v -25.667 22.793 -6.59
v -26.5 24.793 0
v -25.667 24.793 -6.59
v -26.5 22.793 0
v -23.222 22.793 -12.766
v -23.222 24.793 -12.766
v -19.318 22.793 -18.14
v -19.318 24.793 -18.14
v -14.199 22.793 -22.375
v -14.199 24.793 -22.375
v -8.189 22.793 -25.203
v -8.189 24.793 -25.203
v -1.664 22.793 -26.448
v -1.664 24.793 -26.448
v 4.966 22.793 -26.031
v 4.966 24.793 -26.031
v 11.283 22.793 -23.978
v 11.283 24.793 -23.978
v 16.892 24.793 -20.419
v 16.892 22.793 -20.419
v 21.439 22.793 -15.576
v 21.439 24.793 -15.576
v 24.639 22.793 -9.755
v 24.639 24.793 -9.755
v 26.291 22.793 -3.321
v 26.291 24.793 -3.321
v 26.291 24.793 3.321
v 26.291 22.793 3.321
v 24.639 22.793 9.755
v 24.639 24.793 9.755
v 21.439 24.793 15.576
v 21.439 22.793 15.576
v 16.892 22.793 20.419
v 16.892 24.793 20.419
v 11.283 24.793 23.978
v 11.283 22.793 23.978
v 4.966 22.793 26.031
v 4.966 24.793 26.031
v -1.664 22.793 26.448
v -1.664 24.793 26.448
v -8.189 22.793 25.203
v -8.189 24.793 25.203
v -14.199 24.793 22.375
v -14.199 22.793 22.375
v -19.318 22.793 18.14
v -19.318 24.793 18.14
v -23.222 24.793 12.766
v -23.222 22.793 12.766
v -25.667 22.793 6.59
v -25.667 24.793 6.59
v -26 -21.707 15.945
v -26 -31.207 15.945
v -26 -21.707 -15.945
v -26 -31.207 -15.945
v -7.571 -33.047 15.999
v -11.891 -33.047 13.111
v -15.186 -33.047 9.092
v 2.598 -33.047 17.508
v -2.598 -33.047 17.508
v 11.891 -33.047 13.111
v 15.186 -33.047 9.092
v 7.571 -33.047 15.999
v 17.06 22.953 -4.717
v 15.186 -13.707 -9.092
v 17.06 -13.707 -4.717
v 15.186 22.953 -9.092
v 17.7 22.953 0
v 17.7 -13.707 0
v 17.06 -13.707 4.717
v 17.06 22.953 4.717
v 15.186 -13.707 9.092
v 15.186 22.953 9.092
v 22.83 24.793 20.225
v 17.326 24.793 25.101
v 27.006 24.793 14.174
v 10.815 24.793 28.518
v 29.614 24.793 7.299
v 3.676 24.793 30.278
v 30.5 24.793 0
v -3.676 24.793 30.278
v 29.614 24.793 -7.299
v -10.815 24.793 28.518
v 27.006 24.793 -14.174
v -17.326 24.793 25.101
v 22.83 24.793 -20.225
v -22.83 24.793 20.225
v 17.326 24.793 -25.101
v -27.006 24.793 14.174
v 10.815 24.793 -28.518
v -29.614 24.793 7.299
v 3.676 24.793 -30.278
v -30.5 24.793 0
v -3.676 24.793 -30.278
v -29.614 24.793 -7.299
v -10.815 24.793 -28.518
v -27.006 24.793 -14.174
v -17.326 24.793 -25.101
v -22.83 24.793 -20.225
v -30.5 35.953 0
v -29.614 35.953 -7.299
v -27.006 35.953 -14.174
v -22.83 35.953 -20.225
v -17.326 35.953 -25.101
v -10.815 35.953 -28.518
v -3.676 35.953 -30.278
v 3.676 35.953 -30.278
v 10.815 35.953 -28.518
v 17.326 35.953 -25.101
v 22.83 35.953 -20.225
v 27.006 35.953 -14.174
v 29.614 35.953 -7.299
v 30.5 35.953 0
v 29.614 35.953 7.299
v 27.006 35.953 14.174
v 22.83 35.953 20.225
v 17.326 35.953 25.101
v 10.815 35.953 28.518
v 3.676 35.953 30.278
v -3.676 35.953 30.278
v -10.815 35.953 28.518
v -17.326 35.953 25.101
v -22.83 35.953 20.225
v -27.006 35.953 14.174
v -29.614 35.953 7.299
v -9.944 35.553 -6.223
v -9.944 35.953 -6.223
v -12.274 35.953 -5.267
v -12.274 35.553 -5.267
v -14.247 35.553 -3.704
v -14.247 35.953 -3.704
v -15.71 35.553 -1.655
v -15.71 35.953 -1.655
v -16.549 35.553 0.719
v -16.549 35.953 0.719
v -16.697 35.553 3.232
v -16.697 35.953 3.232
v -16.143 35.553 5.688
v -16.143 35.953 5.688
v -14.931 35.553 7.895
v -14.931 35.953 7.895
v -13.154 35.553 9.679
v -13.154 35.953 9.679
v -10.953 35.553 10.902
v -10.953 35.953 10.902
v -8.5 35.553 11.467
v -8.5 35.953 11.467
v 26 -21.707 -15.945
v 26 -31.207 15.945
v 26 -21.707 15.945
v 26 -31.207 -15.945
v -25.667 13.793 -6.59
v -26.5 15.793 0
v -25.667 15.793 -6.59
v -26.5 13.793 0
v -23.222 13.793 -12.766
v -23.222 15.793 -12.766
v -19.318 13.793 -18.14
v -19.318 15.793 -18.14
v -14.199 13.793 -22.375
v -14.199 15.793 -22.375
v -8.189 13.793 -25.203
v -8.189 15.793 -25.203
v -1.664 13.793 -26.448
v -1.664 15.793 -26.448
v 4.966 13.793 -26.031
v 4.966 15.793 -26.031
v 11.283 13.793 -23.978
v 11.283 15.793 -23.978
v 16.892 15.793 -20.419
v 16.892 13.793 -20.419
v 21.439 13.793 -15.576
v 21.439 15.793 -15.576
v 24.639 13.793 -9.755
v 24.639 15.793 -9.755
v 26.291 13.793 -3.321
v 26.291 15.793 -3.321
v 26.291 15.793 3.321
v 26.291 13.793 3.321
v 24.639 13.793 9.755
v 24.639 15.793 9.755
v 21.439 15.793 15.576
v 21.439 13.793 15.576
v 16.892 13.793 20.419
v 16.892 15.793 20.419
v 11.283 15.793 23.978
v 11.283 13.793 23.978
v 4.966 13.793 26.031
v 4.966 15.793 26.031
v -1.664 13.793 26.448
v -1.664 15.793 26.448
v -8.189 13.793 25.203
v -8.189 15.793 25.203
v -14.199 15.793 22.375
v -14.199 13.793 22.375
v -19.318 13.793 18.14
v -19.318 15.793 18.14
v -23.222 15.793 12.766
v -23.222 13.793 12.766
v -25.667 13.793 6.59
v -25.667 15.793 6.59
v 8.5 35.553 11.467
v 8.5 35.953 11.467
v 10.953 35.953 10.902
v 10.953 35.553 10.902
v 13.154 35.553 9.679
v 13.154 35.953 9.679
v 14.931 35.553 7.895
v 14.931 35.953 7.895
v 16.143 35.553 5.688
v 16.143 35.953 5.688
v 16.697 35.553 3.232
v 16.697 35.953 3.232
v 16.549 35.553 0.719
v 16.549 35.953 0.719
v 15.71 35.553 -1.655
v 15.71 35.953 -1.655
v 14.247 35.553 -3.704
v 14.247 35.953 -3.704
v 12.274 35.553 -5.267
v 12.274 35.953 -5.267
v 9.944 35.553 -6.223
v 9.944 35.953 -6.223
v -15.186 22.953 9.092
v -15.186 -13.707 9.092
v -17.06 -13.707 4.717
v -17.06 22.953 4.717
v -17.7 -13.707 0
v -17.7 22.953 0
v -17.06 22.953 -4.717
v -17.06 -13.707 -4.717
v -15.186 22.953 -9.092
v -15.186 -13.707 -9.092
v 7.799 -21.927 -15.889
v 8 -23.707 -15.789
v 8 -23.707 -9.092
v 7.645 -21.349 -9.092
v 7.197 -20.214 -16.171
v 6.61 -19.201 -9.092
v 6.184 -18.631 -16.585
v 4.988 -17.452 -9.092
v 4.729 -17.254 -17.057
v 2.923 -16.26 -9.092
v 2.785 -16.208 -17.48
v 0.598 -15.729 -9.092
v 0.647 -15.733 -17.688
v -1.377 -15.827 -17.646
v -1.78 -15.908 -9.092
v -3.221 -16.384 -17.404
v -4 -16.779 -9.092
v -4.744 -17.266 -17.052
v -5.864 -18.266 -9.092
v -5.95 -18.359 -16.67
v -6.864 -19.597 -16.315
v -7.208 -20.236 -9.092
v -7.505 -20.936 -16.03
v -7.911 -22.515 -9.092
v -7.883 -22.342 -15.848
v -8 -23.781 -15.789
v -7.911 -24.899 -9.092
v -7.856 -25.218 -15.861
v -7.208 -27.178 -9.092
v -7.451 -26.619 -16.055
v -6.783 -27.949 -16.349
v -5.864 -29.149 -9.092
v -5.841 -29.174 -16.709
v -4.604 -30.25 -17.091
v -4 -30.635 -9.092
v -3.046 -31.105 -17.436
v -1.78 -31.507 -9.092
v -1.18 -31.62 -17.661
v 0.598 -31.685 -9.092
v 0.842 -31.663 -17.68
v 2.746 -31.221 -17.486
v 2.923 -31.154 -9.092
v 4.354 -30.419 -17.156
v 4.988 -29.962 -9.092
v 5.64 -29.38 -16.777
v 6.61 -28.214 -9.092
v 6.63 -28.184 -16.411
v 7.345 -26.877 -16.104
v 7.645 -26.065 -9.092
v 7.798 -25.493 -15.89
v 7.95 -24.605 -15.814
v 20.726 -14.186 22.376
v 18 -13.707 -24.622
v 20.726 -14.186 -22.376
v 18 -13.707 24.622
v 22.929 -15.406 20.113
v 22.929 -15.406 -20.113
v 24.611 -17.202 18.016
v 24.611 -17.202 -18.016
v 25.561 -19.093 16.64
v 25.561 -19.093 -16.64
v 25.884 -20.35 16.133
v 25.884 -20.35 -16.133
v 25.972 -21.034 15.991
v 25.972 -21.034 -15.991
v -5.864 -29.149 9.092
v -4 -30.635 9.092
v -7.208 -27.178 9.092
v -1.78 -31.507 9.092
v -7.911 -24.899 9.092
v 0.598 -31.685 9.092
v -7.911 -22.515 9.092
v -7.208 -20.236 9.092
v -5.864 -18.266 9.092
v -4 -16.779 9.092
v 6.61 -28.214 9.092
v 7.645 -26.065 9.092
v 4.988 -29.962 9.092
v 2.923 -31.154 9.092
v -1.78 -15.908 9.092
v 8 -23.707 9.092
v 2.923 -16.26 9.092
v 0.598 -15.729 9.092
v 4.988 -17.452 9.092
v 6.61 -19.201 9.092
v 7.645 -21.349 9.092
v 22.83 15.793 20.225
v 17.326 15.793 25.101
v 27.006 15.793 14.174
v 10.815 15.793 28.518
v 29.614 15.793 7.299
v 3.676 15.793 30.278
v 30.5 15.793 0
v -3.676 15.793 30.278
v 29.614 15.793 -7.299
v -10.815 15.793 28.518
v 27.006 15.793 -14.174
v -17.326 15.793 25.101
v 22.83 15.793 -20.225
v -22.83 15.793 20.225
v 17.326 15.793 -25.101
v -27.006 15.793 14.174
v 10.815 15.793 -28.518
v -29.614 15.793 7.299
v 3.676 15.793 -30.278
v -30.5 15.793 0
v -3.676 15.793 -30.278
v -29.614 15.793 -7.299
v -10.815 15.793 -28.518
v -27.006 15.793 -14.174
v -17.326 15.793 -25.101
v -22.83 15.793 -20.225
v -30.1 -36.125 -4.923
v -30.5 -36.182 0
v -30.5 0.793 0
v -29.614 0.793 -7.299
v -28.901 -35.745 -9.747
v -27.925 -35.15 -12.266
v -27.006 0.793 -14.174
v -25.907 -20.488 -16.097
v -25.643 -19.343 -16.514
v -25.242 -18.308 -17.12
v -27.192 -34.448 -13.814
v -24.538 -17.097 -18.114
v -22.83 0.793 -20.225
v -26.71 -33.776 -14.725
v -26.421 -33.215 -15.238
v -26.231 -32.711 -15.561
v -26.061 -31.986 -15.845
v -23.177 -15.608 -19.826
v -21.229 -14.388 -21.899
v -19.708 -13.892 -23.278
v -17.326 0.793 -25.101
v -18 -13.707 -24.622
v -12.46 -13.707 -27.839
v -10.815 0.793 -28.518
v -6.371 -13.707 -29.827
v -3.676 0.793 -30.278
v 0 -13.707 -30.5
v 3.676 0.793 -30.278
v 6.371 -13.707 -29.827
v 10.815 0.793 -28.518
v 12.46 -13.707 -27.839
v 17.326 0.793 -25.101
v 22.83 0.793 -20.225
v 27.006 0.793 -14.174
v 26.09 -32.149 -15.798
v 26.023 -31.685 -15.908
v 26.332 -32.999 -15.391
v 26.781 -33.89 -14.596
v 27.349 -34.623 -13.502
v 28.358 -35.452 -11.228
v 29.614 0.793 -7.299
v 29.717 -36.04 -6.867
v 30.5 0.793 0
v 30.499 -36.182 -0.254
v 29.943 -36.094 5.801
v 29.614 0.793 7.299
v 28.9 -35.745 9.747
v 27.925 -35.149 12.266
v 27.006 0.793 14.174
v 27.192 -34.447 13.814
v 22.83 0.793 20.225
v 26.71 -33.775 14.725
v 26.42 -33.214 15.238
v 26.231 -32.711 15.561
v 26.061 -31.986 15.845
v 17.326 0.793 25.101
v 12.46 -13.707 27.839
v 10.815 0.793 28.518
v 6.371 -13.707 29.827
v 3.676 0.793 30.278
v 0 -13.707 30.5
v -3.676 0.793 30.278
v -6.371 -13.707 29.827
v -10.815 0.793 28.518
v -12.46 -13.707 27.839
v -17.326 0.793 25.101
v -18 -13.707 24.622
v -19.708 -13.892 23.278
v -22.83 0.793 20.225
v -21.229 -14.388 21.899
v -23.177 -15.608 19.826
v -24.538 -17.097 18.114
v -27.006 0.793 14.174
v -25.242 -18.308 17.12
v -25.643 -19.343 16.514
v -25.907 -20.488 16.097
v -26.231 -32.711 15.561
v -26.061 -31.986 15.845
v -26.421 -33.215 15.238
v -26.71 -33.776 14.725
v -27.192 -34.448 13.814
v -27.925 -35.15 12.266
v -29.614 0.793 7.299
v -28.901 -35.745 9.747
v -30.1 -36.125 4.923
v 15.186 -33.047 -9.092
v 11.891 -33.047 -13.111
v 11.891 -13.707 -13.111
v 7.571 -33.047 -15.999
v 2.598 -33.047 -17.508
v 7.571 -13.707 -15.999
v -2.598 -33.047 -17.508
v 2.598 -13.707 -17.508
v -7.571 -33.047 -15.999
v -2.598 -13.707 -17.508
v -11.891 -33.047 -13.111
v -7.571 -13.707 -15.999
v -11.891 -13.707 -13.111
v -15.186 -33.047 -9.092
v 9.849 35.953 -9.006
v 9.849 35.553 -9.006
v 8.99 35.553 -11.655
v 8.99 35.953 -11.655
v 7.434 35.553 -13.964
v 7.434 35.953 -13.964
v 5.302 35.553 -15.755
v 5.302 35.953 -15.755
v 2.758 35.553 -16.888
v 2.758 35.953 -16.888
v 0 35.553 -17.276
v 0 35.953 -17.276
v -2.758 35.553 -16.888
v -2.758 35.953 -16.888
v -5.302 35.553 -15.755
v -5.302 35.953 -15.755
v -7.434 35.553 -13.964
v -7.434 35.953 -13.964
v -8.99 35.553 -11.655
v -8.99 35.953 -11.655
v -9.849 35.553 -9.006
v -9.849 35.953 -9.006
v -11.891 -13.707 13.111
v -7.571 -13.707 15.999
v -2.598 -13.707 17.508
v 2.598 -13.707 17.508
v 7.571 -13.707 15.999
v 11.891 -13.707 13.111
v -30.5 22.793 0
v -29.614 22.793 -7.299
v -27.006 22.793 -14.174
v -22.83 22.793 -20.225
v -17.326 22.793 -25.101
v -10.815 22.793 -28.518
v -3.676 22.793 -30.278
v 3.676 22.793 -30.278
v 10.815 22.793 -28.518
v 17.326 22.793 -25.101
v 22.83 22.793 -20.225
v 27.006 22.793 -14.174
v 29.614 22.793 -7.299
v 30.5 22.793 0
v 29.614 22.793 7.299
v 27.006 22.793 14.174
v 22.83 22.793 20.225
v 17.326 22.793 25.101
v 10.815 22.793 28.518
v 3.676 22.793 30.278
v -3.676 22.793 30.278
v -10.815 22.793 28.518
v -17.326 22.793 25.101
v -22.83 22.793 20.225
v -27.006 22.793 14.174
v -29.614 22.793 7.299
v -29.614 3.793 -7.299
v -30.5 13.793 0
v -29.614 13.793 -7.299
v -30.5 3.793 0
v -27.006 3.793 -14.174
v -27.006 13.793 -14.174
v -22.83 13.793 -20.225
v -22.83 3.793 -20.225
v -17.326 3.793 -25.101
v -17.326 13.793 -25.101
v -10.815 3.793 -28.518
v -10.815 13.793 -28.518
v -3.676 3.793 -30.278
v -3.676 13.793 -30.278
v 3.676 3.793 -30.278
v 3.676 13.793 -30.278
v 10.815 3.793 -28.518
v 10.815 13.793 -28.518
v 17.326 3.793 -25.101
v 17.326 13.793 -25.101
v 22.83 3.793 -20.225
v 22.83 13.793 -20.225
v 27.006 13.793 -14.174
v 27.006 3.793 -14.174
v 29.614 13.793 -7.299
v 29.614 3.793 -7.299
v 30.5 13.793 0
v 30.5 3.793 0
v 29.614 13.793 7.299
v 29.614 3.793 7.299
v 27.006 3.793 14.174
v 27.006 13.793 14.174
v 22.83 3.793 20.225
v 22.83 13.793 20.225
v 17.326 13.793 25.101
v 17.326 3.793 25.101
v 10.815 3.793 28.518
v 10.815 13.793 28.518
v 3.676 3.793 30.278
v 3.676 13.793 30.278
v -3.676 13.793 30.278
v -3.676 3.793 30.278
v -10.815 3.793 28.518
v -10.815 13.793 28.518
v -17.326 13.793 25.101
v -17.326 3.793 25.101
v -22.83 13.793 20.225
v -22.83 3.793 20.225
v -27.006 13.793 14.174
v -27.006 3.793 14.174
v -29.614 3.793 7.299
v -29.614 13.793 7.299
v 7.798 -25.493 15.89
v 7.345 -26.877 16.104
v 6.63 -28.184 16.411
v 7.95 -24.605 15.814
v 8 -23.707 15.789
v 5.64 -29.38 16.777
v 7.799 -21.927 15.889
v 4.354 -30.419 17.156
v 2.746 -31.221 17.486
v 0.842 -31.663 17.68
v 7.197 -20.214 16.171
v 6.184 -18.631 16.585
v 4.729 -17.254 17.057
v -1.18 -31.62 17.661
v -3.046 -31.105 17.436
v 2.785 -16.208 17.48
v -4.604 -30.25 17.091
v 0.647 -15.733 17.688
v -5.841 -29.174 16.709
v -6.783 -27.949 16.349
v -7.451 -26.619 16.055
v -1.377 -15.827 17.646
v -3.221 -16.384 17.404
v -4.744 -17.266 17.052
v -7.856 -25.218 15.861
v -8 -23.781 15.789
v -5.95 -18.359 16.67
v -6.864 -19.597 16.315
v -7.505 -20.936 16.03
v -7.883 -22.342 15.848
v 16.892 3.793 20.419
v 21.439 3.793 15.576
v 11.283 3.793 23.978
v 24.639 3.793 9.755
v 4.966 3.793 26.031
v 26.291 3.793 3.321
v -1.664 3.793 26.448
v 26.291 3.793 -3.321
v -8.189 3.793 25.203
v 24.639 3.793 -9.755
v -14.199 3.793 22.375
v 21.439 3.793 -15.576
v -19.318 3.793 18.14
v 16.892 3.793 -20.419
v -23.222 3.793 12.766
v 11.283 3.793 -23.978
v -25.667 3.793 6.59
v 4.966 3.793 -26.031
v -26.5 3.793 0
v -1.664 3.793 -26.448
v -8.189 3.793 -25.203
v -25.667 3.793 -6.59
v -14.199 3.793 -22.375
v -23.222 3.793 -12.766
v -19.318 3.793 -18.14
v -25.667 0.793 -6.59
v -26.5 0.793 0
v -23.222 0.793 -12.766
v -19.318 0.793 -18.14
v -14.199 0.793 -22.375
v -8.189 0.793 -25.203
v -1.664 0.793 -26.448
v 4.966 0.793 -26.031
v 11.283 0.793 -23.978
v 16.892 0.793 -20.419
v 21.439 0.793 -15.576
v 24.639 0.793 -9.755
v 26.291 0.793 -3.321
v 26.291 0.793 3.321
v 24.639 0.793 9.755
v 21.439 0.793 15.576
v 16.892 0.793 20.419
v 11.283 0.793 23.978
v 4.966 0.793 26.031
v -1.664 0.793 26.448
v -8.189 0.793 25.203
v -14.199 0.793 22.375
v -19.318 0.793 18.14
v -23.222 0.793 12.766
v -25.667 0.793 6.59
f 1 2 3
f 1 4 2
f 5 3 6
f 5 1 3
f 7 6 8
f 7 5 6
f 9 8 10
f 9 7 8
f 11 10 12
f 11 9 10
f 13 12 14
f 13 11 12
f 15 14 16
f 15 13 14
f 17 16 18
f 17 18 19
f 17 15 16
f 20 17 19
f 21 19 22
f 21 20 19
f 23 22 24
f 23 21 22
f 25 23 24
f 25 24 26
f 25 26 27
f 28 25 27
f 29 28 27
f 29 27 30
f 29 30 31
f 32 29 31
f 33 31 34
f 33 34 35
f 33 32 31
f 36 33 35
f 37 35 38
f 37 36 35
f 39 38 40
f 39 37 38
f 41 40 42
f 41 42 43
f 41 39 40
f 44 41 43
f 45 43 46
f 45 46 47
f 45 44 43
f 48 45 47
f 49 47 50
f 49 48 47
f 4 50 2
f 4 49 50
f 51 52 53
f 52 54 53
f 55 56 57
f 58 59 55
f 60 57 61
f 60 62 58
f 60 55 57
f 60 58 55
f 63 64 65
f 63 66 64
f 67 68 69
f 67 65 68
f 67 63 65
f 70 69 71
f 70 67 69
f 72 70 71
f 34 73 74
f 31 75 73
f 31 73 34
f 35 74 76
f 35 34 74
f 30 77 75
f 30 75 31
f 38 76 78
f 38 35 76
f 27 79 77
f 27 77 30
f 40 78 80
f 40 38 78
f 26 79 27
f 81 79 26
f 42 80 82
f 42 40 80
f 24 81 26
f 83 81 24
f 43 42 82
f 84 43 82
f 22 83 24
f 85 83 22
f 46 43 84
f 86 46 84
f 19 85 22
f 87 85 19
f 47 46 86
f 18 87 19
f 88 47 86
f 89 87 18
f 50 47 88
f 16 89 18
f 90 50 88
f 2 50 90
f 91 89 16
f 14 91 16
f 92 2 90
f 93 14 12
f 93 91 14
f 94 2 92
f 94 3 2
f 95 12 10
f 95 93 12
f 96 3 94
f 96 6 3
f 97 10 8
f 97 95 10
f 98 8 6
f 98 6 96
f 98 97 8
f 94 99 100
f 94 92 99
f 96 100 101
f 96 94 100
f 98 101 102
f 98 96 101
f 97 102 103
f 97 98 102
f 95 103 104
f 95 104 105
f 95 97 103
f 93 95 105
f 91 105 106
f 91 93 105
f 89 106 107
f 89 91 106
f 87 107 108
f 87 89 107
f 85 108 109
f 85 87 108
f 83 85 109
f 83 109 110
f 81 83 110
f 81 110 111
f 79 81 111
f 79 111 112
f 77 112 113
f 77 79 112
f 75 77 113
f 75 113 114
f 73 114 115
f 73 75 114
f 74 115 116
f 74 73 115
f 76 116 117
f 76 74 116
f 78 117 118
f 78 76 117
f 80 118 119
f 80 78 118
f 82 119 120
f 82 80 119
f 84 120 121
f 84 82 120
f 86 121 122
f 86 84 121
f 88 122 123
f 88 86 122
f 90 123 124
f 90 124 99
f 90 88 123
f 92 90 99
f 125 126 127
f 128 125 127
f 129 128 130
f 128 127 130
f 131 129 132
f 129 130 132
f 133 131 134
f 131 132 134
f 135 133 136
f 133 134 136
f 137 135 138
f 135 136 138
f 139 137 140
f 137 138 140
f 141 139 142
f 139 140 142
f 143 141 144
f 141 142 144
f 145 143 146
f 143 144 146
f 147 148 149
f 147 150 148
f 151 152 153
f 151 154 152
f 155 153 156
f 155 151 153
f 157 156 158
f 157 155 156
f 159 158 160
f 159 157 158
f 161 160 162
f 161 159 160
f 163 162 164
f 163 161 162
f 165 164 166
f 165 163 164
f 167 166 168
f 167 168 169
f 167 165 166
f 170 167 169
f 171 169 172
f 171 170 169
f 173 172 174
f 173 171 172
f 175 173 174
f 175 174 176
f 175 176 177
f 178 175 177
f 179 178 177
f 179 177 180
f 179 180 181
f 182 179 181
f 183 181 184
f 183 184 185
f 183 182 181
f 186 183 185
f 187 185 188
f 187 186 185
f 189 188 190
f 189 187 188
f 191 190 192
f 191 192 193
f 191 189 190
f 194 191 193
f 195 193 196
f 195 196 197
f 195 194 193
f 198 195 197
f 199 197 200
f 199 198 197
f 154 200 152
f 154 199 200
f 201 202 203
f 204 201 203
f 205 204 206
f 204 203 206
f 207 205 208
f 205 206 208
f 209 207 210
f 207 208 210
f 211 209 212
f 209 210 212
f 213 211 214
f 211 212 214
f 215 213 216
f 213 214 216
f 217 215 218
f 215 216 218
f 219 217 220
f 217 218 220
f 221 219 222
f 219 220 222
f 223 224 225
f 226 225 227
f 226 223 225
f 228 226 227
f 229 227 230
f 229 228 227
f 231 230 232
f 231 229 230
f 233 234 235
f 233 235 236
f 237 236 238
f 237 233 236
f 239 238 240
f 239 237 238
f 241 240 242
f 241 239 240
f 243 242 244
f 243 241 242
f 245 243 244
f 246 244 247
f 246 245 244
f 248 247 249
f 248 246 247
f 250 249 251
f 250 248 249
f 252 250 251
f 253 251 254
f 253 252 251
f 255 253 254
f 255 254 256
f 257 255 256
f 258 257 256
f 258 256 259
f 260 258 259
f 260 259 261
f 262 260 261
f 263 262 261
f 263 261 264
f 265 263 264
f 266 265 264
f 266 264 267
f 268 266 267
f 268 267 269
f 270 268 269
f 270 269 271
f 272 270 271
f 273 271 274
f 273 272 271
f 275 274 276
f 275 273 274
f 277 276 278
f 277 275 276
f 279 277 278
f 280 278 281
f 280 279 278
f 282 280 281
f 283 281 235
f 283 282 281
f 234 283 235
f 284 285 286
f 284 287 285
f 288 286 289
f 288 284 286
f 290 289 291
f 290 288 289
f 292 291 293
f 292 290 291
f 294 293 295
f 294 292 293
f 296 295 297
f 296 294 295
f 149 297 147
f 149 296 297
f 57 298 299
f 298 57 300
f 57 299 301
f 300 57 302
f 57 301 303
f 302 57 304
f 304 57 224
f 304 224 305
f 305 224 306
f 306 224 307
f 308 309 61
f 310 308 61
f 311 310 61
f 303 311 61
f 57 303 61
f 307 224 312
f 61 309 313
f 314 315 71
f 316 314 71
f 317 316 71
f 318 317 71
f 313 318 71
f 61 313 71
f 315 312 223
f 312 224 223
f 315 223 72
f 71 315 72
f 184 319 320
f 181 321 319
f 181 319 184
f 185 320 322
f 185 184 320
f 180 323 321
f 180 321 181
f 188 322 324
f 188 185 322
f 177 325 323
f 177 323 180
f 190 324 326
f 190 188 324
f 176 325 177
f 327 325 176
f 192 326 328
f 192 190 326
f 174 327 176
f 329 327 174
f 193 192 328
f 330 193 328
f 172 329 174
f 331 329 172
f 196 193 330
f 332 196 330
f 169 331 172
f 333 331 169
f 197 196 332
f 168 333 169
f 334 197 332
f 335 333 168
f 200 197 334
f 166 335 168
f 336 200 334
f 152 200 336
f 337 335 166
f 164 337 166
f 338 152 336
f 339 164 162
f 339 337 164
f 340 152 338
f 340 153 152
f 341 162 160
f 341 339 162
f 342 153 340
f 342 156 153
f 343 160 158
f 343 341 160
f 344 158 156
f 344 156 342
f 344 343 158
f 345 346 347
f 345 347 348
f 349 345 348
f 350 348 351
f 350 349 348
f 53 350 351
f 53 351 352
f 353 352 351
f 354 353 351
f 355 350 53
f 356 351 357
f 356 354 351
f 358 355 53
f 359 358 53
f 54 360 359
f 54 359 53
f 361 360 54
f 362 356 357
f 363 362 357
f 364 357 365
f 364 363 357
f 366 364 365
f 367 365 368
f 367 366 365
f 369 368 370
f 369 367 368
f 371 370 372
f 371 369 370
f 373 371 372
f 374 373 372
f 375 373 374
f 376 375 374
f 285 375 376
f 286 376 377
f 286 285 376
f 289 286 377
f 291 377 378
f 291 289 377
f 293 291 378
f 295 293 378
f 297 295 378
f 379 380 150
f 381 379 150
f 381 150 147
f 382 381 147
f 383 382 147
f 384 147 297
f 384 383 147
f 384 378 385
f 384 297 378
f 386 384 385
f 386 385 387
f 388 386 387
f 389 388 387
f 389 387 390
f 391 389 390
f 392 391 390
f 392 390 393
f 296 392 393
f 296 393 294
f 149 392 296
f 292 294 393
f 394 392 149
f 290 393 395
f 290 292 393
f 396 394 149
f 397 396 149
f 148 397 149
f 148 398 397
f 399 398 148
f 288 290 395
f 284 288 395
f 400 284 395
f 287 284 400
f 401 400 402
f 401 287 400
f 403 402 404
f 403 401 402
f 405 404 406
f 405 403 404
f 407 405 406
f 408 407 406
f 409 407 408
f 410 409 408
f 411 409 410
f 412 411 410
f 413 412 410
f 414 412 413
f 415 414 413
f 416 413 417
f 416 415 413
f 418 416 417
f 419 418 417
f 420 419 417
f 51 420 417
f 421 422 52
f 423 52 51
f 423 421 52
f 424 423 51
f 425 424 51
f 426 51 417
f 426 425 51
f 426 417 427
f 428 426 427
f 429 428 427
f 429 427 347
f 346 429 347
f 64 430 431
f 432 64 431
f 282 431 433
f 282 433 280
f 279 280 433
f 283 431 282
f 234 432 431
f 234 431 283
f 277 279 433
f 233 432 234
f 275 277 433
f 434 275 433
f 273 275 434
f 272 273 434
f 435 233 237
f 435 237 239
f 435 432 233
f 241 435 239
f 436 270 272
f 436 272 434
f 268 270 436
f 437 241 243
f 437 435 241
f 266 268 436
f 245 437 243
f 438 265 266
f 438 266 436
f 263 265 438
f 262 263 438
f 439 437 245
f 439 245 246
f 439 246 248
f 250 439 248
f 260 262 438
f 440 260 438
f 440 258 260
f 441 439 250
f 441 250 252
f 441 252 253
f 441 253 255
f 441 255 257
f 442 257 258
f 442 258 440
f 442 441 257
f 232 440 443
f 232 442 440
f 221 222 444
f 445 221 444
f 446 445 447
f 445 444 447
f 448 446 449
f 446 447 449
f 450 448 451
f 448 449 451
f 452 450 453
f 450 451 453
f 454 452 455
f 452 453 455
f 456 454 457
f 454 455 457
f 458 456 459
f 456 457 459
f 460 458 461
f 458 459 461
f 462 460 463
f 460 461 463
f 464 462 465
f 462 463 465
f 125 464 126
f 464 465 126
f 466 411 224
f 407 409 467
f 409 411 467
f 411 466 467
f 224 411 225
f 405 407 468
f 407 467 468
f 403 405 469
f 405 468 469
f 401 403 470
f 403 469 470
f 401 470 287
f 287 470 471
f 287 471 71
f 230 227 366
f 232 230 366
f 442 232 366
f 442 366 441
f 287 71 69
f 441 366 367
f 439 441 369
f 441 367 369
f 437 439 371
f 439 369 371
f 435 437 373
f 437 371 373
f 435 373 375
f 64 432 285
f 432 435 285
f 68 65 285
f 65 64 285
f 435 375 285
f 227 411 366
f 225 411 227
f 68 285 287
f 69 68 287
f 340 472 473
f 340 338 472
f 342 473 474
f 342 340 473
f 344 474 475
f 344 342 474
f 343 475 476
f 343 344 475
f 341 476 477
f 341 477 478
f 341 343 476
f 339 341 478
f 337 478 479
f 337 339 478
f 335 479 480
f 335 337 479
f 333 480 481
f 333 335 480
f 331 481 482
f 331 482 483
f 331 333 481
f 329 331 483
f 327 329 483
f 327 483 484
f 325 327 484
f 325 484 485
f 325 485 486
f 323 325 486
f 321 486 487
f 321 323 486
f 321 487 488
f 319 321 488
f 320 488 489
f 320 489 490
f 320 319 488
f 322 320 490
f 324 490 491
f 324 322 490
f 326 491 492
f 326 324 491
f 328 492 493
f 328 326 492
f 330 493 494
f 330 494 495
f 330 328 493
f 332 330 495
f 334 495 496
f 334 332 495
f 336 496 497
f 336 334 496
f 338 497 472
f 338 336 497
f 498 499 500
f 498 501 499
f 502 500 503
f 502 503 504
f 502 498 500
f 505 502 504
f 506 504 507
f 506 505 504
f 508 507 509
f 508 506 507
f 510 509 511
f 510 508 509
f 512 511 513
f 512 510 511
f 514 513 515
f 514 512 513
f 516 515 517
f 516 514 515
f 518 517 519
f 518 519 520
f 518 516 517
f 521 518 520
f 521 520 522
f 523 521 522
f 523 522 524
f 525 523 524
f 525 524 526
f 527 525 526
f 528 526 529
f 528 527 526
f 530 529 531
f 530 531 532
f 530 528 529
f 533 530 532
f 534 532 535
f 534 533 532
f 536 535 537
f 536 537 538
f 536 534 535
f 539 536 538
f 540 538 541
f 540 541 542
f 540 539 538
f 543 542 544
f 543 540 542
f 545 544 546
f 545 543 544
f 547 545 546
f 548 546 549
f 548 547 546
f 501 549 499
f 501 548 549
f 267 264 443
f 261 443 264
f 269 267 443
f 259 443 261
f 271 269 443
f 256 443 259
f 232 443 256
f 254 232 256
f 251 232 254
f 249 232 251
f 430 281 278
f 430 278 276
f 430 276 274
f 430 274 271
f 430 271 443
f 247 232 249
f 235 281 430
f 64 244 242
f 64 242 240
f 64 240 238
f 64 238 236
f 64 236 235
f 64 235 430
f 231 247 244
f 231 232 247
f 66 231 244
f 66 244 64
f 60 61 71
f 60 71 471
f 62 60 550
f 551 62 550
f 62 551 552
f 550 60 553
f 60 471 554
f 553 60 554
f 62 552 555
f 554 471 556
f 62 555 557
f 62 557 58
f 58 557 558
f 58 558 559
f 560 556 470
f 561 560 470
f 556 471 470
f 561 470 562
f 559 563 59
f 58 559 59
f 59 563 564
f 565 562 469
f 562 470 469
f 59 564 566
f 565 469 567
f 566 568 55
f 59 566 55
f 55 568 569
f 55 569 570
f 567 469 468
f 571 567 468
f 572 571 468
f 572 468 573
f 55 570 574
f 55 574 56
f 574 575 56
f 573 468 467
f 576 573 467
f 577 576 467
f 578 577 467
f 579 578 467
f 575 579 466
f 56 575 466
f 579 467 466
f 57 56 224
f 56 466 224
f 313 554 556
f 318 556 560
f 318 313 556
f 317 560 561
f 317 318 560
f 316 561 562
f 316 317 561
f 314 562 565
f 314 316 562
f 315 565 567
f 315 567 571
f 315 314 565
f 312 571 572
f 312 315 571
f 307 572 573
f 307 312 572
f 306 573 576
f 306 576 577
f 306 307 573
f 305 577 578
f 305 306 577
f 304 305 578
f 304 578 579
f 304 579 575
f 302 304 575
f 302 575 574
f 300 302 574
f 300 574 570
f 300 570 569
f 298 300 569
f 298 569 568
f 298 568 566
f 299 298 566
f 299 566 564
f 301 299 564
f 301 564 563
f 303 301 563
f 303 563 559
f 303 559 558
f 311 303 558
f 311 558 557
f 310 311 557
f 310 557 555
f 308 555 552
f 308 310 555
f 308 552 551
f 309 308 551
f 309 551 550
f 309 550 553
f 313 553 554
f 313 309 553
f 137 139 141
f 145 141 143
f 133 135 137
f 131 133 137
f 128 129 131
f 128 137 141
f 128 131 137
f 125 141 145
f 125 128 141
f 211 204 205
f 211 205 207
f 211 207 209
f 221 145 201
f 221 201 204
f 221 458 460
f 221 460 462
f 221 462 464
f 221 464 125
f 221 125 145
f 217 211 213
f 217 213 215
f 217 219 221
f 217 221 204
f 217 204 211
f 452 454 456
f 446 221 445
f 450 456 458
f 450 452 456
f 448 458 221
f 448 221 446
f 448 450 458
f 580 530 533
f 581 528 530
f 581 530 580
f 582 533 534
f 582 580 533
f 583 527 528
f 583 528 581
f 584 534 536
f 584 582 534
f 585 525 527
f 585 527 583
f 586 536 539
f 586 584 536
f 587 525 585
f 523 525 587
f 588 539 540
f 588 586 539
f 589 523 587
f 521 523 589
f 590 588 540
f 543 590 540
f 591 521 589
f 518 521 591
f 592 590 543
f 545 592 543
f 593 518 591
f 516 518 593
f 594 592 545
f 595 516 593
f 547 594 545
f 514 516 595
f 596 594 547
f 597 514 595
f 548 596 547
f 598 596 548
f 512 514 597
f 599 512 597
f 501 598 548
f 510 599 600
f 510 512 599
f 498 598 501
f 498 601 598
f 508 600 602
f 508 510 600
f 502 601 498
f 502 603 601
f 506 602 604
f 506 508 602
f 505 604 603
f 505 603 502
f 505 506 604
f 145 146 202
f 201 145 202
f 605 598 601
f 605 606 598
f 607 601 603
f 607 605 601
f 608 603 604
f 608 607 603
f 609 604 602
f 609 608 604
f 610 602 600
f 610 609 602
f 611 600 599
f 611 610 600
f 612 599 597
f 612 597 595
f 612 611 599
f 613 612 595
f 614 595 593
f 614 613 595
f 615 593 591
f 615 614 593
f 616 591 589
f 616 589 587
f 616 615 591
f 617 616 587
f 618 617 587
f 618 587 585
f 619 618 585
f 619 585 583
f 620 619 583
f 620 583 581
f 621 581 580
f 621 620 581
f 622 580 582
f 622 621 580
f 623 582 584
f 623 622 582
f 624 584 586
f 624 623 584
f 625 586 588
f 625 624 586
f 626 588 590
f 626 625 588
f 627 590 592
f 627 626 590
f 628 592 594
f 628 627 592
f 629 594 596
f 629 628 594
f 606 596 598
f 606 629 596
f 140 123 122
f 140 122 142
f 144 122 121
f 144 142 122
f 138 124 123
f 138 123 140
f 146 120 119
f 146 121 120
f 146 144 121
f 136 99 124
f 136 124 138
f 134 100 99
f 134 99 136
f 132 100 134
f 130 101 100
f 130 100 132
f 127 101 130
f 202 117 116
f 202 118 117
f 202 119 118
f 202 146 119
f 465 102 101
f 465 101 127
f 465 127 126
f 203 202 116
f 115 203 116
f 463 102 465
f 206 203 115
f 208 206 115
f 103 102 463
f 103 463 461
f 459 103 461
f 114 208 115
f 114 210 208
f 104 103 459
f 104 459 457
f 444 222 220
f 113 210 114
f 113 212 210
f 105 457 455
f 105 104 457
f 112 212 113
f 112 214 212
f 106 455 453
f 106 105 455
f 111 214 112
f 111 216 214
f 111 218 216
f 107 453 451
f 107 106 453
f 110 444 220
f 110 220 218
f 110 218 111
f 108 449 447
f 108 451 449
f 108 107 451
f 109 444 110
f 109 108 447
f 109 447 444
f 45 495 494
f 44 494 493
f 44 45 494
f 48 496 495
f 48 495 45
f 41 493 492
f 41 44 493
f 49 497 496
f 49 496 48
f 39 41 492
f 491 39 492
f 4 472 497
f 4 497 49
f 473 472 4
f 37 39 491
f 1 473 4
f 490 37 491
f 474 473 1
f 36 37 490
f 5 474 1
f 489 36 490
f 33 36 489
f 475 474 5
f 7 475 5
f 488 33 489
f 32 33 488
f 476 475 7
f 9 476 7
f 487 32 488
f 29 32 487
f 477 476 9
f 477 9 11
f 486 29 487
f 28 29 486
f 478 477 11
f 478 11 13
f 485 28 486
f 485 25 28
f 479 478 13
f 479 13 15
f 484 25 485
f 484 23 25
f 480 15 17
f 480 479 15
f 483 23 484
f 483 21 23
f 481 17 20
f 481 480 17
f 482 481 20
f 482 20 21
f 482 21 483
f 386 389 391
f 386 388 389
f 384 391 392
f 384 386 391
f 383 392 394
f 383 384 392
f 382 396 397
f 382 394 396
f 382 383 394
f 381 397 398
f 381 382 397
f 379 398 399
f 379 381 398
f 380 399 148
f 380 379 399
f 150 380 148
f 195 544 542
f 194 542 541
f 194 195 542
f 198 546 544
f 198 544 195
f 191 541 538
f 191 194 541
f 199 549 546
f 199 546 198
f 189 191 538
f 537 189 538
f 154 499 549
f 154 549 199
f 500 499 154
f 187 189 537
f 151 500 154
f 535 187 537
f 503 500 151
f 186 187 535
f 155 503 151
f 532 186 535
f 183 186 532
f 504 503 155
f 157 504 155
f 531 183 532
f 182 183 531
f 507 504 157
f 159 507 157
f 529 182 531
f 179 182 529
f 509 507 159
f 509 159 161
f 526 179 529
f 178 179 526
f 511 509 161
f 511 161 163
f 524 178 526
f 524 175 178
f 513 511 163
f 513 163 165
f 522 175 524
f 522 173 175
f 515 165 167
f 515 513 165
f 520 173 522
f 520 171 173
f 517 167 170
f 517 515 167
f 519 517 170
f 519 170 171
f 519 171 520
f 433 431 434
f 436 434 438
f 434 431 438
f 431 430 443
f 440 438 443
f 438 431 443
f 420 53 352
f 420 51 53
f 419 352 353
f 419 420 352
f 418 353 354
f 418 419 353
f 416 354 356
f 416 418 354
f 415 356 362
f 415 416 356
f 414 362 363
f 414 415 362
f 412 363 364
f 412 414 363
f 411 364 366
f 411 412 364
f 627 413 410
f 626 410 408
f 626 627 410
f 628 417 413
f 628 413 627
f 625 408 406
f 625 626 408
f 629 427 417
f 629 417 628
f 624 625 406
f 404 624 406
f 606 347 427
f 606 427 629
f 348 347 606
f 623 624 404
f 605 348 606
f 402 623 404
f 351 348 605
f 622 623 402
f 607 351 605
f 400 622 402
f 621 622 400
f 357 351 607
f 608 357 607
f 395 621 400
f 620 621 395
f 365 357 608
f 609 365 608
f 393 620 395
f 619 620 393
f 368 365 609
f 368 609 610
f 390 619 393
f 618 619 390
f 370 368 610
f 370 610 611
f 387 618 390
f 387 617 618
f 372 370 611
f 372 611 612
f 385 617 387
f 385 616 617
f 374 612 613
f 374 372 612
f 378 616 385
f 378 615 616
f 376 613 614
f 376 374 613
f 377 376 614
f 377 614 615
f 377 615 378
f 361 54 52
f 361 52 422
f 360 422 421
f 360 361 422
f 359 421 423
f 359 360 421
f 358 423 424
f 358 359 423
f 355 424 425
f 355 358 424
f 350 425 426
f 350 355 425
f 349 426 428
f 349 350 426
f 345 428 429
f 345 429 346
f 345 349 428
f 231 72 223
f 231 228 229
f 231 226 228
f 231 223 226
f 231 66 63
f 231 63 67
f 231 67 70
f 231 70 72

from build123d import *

# Parameters (mm, degrees)
CUT_EXTRUDE1_DEPTH      = 57.315677826
CUT_EXTRUDE1_DEPTH_BACK = 57.315677826
SKETCH2_W               = 52
SKETCH2_H               = 45
FILLET1_R               = 8
BOSS_EXTRUDE1_DEPTH     = 56
CUT_EXTRUDE2_DEPTH      = 62.715224497
CUT_EXTRUDE2_DEPTH_BACK = 62.715224497
SKETCH4_R               = 8
FILLET2_START           = -17
FILLET2_DEPTH           = 34
CUT_EXTRUDE3_DEPTH      = 0.4


with BuildPart() as part:
    # Sketch1 → Revolve1 (revolve)
    with BuildSketch(Plane.XY):
        Polygon((0, 35.952879581), (-30.5, 35.952879581), (-30.5, 24.792879581), (-26.5, 24.792879581), (-26.5, 22.792879581), (-30.5, 22.792879581), (-30.5, 15.792879581), (-26.5, 15.792879581), (-26.5, 13.792879581), (-30.5, 13.792879581), (-30.5, 3.792879581), (-26.5, 3.792879581), (-26.5, 0.792879581), (-30.5, 0.792879581), (-30.5, -36.207120419), (-17.7, -36.207120419), (-17.7, 22.952879581), (0, 22.952879581), align=None)
    revolve(axis=Axis((0, 39.251308901, 0), (0, -1, 0)))

    # Sketch2 → Cut-Extrude1 (cut, two sides: drawn at the far end of the back side and taken through both)
    with BuildSketch(Plane.XY.offset(-CUT_EXTRUDE1_DEPTH_BACK)):
        with Locations((0, -36.207120419)):
            Rectangle(SKETCH2_W, SKETCH2_H)
    extrude(amount=CUT_EXTRUDE1_DEPTH + CUT_EXTRUDE1_DEPTH_BACK, mode=Mode.SUBTRACT)

    # Fillet1
    fillet1_edges = [part.edges().sort_by_distance(p)[0] for p in [
        (26, -13.707120419, 0),
        (-26, -13.707120419, 0),
    ]]
    fillet(fillet1_edges, radius=FILLET1_R)

    # Sketch3 → Boss-Extrude1 (add)
    with BuildSketch(Plane.XZ.offset(-22.952879581)):
        with BuildLine():
            Line((-15.186081342, -9.092465753), (15.186081342, -9.092465753))
            ThreePointArc((15.186081342, -9.092465753), (0, -17.7), (-15.186081342, -9.092465753))
        make_face()
        with BuildLine():
            Line((-15.186081342, 9.092465753), (15.186081342, 9.092465753))
            ThreePointArc((15.186081342, 9.092465753), (0, 17.7), (-15.186081342, 9.092465753))
        make_face()
    extrude(amount=BOSS_EXTRUDE1_DEPTH)

    # Sketch4 → Cut-Extrude2 (cut, two sides: drawn at the far end of the back side and taken through both)
    with BuildSketch(Plane.XY.offset(-9.092465753).offset(-CUT_EXTRUDE2_DEPTH_BACK)):
        with Locations((0, -23.707120419)):
            Circle(SKETCH4_R)
    extrude(amount=CUT_EXTRUDE2_DEPTH + CUT_EXTRUDE2_DEPTH_BACK, mode=Mode.SUBTRACT)

    # Fillet2: read off the stored shape, not the designer's step
    # Fillet2 outline → Fillet2 (cut)
    with BuildSketch(Plane.XY.offset(FILLET2_START)):
        with BuildLine():
            Line((30.749452468, -36.207120419), (30.500160015, -36.182073684))
            ThreePointArc((30.500160015, -36.182073684), (27.291954698, -34.561282019), (26, -31.207120419))
            Line((26, -31.207120419), (26, -36.207120419))
            Line((26, -36.207120419), (30.749452468, -36.207120419))
        make_face()
        with BuildLine():
            Line((-26, -36.207120419), (-26, -31.207120419))
            ThreePointArc((-26, -31.207120419), (-27.291900757, -34.561222386), (-30.500000003, -36.182057605))
            Line((-30.500000003, -36.182057605), (-30.749371855, -36.207120419))
            Line((-30.749371855, -36.207120419), (-26, -36.207120419))
        make_face()
    extrude(amount=FILLET2_DEPTH, mode=Mode.SUBTRACT)

    # Sketch5 → Cut-Extrude3 (cut)
    with BuildSketch(Plane(origin=(0, 35.952879581, 0), x_dir=(1, 0, 0), z_dir=(0, 1, 0))):
        with BuildLine():
            Line((-8.5, -11.466567669), (8.5, -11.466567669))
            ThreePointArc((8.5, -11.466567669), (16.696900168, -3.232277046), (9.94436139, 6.222665285))
            ThreePointArc((9.94436139, 6.222665285), (0, 17.276077147), (-9.94436139, 6.222665285))
            ThreePointArc((-9.94436139, 6.222665285), (-16.696900168, -3.232277046), (-8.5, -11.466567669))
        make_face()
    extrude(amount=-CUT_EXTRUDE3_DEPTH, mode=Mode.SUBTRACT)


solid = part.part
